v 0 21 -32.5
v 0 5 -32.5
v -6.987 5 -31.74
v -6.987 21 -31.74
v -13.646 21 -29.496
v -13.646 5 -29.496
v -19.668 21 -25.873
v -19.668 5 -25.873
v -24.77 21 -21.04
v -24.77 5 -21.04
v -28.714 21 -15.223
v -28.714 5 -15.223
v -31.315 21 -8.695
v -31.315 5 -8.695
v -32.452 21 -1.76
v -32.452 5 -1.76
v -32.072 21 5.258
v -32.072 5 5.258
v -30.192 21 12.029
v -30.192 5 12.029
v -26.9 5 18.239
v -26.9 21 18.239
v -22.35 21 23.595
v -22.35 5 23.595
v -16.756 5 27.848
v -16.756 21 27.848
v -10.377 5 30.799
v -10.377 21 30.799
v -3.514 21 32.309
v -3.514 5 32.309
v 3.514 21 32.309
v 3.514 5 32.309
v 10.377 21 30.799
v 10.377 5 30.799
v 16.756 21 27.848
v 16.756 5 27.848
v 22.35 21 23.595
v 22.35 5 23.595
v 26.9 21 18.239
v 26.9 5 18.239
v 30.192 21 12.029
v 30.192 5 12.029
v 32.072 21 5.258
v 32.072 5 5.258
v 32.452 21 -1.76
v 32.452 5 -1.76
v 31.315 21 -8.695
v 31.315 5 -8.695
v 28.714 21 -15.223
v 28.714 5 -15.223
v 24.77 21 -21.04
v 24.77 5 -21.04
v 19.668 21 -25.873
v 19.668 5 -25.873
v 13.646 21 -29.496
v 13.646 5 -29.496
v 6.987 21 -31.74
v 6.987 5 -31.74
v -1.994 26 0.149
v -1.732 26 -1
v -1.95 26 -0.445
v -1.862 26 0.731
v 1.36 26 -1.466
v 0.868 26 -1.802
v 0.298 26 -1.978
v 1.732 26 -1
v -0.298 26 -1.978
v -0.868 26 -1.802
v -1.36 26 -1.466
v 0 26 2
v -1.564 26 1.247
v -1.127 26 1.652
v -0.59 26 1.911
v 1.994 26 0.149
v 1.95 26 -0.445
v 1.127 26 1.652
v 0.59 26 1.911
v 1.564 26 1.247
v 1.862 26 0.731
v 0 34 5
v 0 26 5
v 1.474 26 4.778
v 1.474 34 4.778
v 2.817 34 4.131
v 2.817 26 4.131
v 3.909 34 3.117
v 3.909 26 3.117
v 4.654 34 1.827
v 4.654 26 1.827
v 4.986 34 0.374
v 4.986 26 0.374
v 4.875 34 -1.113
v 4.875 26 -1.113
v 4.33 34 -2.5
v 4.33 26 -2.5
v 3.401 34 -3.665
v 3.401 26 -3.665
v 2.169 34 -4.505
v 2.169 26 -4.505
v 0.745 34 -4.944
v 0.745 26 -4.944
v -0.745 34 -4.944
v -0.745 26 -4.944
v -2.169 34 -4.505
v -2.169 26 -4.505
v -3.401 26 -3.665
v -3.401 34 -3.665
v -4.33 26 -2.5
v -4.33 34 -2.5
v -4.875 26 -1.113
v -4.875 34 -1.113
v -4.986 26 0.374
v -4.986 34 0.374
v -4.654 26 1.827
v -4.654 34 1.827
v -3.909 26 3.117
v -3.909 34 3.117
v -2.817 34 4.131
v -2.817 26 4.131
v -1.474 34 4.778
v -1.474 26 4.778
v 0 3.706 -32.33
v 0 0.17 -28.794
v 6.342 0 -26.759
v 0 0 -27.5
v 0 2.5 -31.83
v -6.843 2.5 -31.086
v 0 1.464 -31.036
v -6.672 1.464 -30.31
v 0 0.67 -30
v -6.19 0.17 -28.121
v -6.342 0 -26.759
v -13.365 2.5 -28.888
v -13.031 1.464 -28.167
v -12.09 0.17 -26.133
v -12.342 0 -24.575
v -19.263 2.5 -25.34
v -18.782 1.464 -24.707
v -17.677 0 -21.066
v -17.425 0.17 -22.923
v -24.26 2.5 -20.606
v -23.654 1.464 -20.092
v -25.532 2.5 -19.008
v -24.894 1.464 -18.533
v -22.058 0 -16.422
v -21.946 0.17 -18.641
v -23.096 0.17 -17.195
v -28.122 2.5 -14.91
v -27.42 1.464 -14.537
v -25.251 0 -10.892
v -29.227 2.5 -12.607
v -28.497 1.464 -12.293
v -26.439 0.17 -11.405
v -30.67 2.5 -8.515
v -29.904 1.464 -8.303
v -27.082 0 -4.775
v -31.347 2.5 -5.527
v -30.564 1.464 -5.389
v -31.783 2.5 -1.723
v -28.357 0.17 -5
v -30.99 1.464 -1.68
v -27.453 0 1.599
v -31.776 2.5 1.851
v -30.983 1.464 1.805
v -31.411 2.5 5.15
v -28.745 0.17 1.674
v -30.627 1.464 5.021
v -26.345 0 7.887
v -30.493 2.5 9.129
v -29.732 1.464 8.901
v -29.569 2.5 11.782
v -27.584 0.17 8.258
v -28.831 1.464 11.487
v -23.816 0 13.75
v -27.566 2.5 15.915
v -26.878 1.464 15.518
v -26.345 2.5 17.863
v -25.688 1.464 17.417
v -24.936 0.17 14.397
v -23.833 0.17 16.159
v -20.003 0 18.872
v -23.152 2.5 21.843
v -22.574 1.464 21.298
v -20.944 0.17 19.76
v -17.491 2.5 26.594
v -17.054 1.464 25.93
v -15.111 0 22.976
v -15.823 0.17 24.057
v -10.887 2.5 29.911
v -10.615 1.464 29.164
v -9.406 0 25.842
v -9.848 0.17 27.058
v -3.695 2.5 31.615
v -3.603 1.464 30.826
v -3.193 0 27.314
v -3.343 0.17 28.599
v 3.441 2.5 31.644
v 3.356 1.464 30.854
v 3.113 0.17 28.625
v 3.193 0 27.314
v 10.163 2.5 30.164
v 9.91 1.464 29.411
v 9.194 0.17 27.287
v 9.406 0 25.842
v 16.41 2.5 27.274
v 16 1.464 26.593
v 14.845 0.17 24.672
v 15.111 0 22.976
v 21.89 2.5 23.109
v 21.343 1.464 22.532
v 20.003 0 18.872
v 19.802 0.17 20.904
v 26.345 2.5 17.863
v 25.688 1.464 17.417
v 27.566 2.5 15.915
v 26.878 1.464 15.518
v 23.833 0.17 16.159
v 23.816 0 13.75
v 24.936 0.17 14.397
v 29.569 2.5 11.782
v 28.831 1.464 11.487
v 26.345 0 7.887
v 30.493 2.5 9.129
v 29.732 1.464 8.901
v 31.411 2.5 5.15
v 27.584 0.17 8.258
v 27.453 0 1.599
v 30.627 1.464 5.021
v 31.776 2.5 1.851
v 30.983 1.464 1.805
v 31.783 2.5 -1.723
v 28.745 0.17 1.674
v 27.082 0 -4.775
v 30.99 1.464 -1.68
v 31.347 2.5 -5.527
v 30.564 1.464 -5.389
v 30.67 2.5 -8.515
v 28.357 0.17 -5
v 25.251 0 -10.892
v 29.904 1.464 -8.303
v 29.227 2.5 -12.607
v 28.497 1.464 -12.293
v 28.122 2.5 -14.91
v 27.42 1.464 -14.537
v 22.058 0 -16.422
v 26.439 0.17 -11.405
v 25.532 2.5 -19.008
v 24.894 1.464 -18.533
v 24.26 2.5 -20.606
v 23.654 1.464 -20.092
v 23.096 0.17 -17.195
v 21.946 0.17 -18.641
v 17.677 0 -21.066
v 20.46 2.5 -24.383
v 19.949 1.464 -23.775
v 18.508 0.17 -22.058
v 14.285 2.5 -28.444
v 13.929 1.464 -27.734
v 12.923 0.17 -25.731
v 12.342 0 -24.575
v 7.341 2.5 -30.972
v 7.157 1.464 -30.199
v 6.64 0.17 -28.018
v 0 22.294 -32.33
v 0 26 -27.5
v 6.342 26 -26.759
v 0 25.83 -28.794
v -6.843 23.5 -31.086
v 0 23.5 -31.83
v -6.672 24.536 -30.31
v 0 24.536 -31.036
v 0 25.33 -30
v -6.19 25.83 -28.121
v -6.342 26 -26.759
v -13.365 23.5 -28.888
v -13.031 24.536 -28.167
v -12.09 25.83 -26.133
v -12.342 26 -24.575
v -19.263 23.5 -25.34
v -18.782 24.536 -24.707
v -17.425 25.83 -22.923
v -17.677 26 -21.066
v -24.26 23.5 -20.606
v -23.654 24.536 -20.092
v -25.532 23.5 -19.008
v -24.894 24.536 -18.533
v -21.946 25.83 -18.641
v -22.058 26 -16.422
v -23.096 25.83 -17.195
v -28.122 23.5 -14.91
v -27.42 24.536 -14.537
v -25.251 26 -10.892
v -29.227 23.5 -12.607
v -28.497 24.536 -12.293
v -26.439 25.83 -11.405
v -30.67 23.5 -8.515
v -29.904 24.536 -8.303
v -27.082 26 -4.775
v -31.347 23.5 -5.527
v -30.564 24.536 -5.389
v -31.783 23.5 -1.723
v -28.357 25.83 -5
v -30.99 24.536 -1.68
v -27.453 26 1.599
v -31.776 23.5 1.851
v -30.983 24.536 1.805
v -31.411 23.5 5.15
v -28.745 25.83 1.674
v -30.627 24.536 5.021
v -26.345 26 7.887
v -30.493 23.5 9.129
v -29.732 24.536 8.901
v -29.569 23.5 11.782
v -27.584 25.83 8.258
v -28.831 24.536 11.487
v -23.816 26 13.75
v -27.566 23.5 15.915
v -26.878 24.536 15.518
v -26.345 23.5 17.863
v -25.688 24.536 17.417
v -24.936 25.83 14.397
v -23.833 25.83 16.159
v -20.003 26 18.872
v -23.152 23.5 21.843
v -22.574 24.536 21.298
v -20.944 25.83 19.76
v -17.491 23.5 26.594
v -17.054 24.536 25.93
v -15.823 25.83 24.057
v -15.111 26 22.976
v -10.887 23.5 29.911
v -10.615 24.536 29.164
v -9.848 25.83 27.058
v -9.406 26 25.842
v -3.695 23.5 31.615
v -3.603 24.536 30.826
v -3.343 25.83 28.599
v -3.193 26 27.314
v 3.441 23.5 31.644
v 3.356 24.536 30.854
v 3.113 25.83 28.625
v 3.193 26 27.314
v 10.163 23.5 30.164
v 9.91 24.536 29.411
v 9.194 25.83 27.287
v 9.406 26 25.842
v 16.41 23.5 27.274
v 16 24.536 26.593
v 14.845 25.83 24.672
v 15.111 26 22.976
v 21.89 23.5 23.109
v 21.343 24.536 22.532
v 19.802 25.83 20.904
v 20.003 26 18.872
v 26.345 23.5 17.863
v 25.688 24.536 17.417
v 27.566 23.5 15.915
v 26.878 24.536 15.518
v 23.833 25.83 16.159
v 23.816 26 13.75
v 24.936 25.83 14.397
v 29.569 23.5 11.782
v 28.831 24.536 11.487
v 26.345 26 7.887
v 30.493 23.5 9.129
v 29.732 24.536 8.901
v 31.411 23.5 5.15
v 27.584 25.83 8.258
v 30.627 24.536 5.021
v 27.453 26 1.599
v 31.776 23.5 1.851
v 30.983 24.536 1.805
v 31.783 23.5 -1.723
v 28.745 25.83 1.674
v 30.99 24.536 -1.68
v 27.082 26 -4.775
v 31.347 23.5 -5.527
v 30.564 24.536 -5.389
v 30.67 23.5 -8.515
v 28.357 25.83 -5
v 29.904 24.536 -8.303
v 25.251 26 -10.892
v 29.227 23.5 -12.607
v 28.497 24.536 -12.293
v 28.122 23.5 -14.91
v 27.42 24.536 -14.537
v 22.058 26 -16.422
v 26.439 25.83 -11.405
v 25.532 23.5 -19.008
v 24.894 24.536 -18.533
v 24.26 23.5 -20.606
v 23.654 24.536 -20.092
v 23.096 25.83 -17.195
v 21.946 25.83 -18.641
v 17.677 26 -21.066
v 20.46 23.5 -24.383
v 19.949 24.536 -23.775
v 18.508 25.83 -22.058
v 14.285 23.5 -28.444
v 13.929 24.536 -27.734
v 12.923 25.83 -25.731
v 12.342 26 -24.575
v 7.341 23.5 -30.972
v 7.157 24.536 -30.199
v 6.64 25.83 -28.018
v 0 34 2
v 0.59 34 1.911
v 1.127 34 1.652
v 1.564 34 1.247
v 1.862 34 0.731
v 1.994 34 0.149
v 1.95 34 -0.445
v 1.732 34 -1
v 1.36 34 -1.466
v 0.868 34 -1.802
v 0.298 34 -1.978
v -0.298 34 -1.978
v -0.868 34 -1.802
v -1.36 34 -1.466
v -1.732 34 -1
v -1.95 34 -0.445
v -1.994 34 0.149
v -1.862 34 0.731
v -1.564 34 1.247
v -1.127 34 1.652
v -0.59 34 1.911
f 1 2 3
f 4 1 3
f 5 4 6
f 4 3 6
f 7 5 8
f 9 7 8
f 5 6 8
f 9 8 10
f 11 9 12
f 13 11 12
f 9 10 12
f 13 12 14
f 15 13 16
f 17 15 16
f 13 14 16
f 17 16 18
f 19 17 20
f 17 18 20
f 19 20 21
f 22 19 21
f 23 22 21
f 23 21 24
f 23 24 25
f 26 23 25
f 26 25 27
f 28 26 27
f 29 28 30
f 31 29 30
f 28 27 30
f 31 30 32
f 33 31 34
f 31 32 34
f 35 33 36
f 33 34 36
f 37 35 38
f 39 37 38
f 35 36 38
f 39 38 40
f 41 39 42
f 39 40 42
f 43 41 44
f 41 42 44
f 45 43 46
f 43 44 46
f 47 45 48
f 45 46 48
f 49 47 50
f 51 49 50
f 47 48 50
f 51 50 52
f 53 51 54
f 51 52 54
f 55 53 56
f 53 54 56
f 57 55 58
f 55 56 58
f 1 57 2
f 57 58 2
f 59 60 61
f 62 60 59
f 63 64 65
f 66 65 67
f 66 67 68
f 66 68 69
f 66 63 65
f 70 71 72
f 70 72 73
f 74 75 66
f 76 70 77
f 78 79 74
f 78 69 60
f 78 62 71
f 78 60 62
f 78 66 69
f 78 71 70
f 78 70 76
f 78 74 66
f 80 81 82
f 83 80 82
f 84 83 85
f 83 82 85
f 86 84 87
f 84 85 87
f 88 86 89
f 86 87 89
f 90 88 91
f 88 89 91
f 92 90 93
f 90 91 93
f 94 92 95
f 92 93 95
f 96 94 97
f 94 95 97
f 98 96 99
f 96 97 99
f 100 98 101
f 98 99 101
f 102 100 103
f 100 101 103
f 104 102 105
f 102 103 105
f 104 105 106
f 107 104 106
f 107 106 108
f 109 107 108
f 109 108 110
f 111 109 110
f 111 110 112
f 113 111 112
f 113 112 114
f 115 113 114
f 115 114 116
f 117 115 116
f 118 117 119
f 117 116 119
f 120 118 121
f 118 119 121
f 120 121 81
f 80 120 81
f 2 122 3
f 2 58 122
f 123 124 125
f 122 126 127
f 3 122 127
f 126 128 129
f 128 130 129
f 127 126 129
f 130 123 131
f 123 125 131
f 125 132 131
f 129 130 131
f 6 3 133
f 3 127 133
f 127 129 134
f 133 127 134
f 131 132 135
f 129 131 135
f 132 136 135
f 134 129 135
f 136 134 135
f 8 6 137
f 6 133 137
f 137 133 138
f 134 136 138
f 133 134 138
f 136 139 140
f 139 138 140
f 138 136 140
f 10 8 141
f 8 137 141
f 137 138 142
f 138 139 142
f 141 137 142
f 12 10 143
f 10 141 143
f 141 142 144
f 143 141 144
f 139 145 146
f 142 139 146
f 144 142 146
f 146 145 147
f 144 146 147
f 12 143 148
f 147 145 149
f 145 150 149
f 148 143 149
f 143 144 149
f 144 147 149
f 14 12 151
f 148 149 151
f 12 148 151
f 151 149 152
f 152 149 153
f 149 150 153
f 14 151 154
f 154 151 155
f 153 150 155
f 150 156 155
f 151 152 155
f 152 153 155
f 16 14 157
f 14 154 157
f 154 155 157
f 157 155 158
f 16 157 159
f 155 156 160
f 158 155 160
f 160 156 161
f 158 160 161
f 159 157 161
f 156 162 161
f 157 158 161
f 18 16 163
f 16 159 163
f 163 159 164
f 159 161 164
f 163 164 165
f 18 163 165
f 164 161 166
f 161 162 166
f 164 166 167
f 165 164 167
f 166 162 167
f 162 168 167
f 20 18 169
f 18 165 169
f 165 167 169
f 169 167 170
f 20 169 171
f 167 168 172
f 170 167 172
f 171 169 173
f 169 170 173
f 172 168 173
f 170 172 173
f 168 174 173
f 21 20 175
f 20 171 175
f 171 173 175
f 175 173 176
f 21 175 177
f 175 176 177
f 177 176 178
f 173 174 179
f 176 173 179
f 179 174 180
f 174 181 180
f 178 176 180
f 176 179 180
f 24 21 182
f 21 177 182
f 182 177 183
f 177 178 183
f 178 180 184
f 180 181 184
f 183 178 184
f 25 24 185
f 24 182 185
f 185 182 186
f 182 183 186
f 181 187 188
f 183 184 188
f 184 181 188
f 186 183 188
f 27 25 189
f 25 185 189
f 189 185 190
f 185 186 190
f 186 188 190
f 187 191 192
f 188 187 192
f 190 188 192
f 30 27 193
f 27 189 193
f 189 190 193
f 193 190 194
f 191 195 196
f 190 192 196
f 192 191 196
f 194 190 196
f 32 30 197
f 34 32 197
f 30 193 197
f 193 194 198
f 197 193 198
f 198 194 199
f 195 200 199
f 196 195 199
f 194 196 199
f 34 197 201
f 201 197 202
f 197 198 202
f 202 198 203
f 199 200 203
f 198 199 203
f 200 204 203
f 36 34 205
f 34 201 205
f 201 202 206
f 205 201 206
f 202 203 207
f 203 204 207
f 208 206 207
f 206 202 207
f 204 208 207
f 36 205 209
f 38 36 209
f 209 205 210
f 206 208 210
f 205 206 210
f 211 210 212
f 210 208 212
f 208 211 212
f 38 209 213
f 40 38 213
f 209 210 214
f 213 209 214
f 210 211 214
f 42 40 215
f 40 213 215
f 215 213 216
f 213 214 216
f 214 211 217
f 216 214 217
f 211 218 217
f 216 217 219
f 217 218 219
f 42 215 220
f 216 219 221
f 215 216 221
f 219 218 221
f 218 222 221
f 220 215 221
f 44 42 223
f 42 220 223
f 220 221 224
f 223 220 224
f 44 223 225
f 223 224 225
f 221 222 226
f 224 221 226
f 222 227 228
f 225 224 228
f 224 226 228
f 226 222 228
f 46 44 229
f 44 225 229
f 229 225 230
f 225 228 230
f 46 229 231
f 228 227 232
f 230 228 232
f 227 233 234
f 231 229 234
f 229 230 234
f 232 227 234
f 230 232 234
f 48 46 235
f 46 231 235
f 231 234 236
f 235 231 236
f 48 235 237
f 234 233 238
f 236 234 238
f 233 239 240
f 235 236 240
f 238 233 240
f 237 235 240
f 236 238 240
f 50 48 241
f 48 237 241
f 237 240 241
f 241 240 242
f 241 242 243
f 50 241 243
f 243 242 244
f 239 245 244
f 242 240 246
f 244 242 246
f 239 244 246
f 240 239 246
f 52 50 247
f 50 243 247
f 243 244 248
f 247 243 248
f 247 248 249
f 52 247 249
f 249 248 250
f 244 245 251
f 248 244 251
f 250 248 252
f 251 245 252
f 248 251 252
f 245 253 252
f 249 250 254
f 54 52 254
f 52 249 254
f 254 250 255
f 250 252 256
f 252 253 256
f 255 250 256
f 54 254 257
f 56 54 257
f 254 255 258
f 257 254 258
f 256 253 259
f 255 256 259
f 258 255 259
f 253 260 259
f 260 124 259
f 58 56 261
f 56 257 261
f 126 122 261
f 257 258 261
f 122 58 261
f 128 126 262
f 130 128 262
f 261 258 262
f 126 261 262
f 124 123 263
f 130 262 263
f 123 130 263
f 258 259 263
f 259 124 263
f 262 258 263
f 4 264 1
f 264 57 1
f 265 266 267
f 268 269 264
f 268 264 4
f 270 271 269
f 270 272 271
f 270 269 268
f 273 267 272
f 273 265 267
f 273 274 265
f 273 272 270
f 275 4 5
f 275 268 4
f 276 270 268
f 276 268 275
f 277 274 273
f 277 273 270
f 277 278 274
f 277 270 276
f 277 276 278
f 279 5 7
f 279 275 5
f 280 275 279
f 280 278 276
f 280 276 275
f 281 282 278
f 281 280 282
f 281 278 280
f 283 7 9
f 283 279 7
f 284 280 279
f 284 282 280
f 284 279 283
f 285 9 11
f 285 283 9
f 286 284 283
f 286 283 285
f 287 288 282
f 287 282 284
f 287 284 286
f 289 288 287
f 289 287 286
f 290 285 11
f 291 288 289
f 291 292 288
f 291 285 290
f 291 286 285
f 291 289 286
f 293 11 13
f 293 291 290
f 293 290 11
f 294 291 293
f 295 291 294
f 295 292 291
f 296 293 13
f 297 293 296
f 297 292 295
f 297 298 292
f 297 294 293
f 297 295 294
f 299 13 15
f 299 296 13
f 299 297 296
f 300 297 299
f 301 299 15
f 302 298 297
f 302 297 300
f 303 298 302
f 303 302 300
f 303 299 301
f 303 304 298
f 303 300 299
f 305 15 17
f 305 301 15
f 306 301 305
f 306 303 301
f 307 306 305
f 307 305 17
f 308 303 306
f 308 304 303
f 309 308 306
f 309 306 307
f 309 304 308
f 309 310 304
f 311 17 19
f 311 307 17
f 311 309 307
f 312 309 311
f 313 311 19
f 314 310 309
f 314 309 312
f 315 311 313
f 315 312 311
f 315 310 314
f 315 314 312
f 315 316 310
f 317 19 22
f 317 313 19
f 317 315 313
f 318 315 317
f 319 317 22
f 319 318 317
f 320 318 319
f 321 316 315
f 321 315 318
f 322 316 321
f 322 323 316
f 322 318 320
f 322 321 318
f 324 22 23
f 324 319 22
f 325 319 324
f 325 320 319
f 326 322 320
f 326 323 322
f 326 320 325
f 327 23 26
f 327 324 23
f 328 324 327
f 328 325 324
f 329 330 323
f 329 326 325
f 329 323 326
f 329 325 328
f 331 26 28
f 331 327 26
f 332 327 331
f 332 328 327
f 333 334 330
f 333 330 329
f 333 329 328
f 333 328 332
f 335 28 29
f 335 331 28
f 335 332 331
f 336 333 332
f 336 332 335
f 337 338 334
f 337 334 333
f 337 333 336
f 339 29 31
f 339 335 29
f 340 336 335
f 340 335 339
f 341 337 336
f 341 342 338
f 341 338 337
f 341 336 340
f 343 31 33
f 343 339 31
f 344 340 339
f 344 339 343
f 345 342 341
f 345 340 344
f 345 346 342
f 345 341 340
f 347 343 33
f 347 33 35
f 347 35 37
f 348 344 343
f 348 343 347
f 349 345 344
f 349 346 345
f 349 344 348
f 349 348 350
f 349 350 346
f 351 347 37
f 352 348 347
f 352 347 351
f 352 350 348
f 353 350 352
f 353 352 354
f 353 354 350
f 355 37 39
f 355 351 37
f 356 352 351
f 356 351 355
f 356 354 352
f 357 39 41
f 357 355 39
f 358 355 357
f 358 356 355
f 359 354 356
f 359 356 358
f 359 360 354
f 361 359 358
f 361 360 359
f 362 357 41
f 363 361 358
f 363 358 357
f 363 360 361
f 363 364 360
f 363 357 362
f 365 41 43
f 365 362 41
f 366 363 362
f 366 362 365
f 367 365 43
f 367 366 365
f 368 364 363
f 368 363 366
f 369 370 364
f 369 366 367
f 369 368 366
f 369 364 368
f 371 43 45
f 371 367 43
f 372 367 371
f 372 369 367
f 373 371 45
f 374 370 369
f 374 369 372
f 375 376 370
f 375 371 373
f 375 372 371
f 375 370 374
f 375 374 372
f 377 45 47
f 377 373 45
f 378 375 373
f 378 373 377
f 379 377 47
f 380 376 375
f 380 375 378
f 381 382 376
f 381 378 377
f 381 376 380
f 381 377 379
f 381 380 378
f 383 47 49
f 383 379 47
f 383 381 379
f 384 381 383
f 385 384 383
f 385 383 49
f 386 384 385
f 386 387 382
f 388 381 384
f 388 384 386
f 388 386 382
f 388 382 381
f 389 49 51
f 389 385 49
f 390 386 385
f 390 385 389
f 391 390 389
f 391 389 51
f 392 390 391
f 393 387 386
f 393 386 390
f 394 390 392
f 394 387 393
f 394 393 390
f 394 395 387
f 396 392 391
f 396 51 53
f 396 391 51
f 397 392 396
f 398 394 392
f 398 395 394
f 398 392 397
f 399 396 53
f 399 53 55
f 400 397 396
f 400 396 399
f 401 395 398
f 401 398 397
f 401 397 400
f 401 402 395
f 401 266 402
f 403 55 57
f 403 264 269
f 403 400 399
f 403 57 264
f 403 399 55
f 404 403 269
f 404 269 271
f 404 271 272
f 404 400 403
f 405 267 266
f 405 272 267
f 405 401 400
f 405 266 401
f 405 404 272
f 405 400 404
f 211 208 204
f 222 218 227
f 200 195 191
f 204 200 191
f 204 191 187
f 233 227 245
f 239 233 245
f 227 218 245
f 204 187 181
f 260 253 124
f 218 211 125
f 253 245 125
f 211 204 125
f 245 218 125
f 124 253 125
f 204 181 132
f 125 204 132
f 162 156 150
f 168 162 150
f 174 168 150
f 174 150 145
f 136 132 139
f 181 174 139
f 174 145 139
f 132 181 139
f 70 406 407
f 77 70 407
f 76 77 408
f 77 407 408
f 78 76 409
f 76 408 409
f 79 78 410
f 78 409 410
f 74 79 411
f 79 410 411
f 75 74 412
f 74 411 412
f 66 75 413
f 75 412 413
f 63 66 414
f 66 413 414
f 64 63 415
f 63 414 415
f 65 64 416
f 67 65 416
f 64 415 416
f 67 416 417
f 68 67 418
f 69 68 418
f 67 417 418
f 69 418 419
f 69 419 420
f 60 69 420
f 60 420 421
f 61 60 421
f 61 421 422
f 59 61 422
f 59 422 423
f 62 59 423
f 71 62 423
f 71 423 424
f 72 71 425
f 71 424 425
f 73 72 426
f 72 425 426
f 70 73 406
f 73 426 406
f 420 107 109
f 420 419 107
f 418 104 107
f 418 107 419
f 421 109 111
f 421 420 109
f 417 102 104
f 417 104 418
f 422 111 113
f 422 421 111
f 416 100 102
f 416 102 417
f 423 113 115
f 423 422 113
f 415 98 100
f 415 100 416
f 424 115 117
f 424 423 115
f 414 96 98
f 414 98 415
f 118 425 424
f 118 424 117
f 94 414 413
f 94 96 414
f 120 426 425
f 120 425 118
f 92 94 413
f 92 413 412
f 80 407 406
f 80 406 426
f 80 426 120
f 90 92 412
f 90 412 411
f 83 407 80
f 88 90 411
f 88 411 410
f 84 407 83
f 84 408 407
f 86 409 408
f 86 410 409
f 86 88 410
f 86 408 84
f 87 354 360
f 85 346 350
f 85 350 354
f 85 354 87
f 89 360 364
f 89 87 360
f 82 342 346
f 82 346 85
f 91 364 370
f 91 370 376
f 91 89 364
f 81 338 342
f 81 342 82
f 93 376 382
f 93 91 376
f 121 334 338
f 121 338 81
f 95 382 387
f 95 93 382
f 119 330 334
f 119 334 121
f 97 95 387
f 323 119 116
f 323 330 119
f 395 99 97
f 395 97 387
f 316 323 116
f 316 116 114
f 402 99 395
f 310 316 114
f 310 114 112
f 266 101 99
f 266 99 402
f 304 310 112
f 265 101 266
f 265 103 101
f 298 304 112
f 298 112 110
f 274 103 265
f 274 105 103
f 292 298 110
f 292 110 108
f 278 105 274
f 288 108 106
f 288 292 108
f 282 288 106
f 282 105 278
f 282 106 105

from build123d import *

# Parameters (mm, degrees)
SKETCH1_R           = 32.5
BOSS_EXTRUDE1_DEPTH = 26
SKETCH2_R           = 5
BOSS_EXTRUDE2_DEPTH = 8
SKETCH3_R           = 2
CUT_EXTRUDE1_DEPTH  = 8
FILLET1_R           = 5


with BuildPart() as part:
    # Sketch1 → Boss-Extrude1 (new body)
    with BuildSketch(Plane(origin=(0, 0, 0), x_dir=(1, 0, 0), z_dir=(0, 1, 0))):
        with Locations(Location((0, 0, 0), (0, 0, 90))):
            Circle(SKETCH1_R)
    extrude(amount=BOSS_EXTRUDE1_DEPTH)

    # Sketch2 → Boss-Extrude2 (add)
    with BuildSketch(Plane(origin=(0, 26, 0), x_dir=(1, 0, 0), z_dir=(0, 1, 0))):
        with Locations(Location((0, 0, 0), (0, 0, 270))):
            Circle(SKETCH2_R)
    extrude(amount=BOSS_EXTRUDE2_DEPTH)

    # Sketch3 → Cut-Extrude1 (cut)
    with BuildSketch(Plane(origin=(0, 34, 0), x_dir=(1, 0, 0), z_dir=(0, 1, 0))):
        with Locations(Location((0, 0, 0), (0, 0, 270))):
            Circle(SKETCH3_R)
    extrude(amount=-CUT_EXTRUDE1_DEPTH, mode=Mode.SUBTRACT)

    # Fillet1
    fillet1_edges = [part.edges().sort_by_distance(p)[0] for p in [
        (0, 0, 32.5),
        (0, 26, 32.5),
    ]]
    fillet(fillet1_edges, radius=FILLET1_R)


solid = part.part
